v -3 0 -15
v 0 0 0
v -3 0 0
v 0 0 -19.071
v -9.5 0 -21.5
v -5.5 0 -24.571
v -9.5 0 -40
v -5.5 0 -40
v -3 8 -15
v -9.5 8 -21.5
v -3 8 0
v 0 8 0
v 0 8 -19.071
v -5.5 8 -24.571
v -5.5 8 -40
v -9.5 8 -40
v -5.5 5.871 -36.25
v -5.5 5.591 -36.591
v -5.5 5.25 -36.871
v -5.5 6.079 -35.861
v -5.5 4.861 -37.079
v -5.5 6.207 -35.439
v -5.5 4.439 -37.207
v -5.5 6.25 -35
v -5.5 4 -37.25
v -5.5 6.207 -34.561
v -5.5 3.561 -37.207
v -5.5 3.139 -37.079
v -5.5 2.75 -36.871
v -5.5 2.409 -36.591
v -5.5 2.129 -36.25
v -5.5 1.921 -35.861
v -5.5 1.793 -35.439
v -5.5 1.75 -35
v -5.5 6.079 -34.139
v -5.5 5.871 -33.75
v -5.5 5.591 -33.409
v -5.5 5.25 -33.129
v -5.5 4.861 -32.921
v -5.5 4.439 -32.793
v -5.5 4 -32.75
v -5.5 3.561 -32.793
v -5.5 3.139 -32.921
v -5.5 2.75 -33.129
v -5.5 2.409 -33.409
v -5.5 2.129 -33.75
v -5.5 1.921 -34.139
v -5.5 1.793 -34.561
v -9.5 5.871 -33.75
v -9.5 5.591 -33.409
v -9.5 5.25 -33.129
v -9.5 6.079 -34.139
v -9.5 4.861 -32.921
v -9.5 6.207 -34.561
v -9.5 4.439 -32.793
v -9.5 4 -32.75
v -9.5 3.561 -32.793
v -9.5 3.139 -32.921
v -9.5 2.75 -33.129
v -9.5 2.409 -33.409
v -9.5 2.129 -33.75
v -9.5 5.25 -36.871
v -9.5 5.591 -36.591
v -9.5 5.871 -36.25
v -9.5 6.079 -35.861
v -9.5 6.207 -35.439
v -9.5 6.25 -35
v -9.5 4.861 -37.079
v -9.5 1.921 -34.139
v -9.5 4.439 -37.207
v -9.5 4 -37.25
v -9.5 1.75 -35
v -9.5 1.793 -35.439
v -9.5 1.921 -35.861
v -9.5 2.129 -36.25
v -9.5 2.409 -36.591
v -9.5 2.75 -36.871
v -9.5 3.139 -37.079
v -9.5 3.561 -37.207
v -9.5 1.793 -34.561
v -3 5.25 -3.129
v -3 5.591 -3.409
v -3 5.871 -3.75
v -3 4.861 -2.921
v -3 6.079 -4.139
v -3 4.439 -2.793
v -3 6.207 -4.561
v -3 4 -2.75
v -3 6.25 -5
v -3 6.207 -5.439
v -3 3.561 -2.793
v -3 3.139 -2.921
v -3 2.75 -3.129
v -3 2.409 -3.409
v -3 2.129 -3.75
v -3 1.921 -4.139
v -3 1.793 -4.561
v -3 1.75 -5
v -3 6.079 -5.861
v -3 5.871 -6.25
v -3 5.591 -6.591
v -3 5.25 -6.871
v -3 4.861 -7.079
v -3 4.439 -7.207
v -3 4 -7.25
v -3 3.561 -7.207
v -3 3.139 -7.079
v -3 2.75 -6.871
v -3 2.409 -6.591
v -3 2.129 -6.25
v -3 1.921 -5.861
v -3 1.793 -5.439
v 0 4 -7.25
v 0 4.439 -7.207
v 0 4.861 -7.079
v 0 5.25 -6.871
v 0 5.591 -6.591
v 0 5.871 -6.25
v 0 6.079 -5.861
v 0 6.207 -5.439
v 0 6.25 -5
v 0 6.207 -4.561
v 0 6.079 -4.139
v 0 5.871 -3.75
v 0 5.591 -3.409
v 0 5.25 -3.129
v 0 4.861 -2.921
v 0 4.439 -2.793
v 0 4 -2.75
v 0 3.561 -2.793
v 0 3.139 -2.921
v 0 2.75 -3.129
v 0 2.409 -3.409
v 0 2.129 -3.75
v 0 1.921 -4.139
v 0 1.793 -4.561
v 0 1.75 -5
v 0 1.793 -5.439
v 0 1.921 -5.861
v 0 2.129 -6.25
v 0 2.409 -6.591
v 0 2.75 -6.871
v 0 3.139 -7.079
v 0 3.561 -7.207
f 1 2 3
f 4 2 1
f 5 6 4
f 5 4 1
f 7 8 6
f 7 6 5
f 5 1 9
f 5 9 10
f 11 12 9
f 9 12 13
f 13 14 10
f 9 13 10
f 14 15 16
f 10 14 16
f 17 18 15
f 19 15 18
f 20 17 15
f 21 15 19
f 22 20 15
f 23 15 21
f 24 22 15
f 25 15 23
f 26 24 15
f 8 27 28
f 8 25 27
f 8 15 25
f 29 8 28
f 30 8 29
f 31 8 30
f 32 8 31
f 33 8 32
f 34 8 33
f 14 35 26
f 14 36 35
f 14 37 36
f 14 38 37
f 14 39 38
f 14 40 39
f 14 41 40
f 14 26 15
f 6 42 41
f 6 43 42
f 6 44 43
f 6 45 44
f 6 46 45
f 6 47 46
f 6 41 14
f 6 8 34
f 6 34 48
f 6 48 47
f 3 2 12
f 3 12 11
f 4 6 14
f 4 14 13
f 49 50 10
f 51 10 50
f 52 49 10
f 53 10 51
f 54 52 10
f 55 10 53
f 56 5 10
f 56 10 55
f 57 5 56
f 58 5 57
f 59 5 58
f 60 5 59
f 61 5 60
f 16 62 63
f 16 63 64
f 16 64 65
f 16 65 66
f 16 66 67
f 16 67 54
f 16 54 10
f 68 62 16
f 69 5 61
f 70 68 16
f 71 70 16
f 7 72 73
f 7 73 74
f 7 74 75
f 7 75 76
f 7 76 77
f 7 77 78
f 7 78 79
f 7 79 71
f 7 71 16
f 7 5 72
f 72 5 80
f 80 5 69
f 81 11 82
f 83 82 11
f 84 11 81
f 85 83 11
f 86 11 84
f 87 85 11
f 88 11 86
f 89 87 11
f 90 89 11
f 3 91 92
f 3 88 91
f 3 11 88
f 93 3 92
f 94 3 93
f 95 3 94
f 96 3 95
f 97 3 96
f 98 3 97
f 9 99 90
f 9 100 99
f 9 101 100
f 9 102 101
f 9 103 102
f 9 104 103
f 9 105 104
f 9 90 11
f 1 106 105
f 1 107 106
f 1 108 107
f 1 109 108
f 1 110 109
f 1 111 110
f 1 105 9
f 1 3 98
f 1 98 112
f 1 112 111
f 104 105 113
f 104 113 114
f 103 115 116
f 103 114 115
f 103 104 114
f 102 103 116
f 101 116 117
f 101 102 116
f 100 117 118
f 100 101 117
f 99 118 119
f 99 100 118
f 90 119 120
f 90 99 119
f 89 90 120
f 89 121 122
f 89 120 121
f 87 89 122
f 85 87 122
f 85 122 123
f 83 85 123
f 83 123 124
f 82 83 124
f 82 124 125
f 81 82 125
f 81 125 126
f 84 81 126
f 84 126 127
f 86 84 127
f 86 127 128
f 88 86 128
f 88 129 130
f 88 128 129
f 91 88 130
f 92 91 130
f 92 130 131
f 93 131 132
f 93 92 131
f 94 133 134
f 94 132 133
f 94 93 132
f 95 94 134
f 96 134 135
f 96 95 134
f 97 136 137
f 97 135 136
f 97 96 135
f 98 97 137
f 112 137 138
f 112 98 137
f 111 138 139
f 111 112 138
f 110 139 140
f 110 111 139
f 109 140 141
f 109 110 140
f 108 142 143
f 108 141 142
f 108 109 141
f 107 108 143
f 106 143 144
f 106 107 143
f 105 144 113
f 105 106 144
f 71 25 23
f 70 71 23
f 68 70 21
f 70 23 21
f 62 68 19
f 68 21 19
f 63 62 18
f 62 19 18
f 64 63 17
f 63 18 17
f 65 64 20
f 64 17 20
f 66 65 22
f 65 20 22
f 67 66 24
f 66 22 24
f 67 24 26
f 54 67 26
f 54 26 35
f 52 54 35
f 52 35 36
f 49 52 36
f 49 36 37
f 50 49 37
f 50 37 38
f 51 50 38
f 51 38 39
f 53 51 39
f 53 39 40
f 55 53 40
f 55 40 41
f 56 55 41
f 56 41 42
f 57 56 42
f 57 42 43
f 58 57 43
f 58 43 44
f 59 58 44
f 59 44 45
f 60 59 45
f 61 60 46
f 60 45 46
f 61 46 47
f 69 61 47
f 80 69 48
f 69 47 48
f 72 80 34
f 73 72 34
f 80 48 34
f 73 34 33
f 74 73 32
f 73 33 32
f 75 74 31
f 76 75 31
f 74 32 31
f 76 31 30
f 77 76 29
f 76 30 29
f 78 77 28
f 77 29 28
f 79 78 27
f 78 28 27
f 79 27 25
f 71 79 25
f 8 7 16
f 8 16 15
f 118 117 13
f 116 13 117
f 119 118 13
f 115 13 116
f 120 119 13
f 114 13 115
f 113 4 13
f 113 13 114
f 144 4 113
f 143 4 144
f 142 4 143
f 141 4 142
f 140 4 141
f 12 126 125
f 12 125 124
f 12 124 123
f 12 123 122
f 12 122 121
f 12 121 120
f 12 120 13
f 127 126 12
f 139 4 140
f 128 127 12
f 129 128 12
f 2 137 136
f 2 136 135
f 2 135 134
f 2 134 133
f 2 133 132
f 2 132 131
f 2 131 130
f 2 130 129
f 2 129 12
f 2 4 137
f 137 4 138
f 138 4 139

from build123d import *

# Parameters (mm, degrees)
BOSS_EXTRUDE1_DEPTH     = 8
SKETCH2_R               = 2.25
CUT_EXTRUDE1_DEPTH      = 6.5
CUT_EXTRUDE1_DEPTH_BACK = 5


with BuildPart() as part:
    # Sketch1 → Boss-Extrude1 (new body)
    with BuildSketch(Plane(origin=(0, 0, 0), x_dir=(1, 0, 0), z_dir=(0, 1, 0))):
        Polygon((0, 0), (-3, 0), (-3, 15), (-9.5, 21.5), (-9.5, 40), (-5.5, 40), (-5.5, 24.571067812), (0, 19.071067812), align=None)
    extrude(amount=BOSS_EXTRUDE1_DEPTH)

    # Sketch2 → Cut-Extrude1 (cut, two sides)
    with BuildSketch(Plane(origin=(-5.5, 0, 0), x_dir=(0, 0, -1), z_dir=(1, 0, 0))) as cut_extrude1_sk:
        with Locations((35, 4)):
            Circle(SKETCH2_R)
        with Locations((5, 4)):
            Circle(SKETCH2_R)
    extrude(amount=CUT_EXTRUDE1_DEPTH, mode=Mode.SUBTRACT)
    extrude(cut_extrude1_sk.sketch, amount=-CUT_EXTRUDE1_DEPTH_BACK, mode=Mode.SUBTRACT)


solid = part.part
